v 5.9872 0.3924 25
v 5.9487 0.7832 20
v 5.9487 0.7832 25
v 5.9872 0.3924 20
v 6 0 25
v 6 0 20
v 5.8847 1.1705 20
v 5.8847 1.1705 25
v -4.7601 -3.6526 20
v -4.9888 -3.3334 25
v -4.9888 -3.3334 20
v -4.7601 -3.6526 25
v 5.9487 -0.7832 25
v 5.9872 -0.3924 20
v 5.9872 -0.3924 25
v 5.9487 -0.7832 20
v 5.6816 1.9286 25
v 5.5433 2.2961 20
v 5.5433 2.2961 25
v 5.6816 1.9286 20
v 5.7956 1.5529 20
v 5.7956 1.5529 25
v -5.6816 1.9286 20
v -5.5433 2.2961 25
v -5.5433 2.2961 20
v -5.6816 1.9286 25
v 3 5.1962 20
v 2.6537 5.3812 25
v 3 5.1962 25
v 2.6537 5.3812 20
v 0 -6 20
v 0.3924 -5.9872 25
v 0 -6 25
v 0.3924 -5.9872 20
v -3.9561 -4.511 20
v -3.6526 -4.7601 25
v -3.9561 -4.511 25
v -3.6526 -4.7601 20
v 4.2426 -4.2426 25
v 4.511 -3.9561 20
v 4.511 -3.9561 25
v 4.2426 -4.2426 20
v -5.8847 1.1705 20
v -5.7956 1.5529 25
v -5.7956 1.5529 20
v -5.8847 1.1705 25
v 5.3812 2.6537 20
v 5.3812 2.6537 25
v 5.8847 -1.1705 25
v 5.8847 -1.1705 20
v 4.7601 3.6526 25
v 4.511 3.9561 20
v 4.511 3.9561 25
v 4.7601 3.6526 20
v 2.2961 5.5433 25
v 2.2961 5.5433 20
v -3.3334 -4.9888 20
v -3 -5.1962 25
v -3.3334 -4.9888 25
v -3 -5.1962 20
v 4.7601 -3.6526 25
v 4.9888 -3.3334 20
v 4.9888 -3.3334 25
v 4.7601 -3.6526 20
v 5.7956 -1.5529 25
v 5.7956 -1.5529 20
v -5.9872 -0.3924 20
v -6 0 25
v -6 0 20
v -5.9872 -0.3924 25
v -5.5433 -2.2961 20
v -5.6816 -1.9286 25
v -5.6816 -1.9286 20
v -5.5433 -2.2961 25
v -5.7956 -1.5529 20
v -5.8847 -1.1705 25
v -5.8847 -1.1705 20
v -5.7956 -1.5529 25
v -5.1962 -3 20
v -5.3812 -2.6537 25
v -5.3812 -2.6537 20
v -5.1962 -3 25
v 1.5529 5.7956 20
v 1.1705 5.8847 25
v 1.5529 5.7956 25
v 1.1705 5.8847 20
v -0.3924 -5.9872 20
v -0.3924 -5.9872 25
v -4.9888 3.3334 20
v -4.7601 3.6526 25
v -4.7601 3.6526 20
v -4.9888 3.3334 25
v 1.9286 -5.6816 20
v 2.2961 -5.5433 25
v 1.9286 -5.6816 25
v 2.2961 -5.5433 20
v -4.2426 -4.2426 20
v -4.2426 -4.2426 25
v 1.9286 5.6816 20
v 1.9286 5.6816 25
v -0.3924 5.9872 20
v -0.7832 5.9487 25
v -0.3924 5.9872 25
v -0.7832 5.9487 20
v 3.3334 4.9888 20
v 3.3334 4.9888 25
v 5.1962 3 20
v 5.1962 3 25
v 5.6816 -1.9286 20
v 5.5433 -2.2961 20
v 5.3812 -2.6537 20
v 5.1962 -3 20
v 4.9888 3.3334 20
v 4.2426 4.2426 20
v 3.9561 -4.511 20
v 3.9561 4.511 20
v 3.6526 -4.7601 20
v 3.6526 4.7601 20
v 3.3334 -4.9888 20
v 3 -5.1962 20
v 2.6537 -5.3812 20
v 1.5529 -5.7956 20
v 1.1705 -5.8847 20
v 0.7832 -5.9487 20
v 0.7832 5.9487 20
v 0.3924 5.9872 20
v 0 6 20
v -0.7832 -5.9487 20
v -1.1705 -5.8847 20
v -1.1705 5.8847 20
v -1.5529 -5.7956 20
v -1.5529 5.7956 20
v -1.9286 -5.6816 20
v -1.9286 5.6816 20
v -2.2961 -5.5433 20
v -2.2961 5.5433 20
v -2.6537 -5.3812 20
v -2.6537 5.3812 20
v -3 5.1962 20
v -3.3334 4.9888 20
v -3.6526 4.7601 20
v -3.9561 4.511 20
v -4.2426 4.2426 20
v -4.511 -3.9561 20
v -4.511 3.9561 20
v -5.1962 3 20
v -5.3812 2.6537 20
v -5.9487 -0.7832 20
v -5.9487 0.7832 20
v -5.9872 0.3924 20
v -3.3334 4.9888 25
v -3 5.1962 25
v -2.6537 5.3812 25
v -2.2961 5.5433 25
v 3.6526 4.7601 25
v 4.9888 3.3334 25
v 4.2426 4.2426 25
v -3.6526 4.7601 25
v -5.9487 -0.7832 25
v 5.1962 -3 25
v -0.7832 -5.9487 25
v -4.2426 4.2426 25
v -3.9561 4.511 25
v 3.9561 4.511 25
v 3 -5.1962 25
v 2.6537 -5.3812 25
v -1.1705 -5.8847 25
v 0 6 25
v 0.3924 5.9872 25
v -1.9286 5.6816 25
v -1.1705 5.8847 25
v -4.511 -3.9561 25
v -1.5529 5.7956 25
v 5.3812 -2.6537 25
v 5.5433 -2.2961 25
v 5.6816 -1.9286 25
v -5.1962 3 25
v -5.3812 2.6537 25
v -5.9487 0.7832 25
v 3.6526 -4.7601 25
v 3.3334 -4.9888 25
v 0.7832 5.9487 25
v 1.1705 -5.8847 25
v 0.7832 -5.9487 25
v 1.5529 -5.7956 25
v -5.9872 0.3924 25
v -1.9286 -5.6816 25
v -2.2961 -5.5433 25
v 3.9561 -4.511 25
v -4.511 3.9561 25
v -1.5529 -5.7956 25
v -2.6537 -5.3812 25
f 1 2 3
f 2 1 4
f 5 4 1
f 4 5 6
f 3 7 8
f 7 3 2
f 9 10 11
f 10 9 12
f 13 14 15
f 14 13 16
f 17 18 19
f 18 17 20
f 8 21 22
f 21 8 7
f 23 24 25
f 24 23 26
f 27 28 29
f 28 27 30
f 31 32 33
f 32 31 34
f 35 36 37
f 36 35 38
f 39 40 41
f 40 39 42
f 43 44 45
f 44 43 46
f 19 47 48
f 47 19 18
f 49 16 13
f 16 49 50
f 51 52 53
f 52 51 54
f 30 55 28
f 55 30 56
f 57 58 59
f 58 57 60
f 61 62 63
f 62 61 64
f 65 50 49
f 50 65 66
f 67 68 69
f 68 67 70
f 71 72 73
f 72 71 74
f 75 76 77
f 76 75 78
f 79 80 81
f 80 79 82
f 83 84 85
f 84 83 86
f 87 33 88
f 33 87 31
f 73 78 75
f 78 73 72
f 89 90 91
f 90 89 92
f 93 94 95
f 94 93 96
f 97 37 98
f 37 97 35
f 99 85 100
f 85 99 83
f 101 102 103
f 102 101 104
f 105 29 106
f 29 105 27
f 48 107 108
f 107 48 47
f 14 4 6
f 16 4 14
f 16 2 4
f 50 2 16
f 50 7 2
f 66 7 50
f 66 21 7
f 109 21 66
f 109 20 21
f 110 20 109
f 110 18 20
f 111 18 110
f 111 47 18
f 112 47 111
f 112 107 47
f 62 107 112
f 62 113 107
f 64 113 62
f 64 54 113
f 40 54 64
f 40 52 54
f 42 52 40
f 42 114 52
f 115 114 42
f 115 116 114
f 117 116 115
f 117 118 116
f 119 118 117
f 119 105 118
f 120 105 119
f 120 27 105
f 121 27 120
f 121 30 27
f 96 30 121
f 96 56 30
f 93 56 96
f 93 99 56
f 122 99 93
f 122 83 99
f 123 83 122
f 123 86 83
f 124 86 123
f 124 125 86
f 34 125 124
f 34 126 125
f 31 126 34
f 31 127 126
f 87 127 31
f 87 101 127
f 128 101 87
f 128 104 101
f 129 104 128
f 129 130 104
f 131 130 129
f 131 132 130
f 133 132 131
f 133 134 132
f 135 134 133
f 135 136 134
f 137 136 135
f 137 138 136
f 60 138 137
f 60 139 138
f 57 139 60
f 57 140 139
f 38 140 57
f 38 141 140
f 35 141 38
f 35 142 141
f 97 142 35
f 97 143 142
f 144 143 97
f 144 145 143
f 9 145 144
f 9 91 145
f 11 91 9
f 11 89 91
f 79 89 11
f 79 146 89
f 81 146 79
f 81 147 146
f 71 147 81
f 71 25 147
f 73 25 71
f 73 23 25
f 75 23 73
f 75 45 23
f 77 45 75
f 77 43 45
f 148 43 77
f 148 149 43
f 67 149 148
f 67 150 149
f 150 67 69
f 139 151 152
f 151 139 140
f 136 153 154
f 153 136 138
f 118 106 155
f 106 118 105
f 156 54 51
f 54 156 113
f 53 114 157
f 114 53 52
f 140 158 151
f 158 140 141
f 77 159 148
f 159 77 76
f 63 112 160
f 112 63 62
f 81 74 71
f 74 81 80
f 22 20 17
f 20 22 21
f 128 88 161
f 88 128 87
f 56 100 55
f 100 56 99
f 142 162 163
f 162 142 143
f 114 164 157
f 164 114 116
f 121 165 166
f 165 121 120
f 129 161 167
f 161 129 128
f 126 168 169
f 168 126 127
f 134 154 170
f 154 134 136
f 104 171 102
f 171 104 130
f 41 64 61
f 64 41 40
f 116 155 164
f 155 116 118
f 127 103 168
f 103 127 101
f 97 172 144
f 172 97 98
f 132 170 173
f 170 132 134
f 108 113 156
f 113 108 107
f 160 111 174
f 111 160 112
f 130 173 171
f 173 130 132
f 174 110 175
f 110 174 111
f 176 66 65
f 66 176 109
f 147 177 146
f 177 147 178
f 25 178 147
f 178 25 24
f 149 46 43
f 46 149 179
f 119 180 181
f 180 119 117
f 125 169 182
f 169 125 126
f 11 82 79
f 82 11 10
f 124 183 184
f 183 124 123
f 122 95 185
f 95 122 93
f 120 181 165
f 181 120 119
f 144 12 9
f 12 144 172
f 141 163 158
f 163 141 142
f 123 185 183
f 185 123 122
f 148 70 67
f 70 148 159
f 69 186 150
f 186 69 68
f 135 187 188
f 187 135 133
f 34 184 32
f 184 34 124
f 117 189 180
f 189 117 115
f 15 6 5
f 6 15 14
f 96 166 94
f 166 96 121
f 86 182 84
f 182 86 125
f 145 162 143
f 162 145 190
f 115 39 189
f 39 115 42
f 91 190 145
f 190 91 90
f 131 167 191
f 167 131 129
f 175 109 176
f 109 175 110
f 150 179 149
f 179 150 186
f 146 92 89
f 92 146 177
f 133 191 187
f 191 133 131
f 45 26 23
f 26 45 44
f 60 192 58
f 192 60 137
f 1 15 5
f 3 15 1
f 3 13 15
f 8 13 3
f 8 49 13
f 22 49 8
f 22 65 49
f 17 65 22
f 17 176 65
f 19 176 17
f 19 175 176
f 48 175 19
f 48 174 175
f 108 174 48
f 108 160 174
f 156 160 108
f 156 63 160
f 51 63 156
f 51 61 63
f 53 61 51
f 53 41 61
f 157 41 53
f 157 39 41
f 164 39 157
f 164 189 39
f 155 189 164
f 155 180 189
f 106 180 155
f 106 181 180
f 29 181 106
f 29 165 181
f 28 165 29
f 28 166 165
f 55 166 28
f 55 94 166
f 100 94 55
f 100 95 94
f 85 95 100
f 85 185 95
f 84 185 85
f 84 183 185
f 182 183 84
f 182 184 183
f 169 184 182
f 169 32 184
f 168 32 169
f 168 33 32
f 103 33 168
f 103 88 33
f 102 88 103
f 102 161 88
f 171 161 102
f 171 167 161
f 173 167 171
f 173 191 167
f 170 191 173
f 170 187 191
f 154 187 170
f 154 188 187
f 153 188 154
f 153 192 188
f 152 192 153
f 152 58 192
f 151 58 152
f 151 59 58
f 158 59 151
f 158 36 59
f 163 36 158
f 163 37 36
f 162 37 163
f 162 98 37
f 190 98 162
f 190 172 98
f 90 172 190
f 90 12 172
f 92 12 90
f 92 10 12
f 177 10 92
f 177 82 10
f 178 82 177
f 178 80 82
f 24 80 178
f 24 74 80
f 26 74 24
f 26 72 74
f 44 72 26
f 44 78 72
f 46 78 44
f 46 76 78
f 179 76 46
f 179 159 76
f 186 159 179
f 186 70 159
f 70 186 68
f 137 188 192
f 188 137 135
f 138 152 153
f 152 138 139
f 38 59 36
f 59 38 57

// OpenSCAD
// Hose-barb reducer: joins 8 mm ID tubing to 5 mm ID tubing
// Print orientation: standing upright along +Z, centred on origin in X/Y

// ---------------- Parameters ----------------
reducer_d      = 10;   // bore diameter (through-hole)
tube8_d        = 8;    // inner diameter of first tubing set
tube5_d        = 5;    // inner diameter of second tubing set
barb8_h        = 10;   // height of each 8 mm barb
barb8_bottom   = 7.5;  // outer diameter of 8 mm barb at bottom
barb8_top      = 9.5;  // outer diameter of 8 mm barb at top
barb8_step     = 7.5;  // outer diameter after the sawtooth step
collar_d       = 12;   // diameter of the collar (z = 20 to 25)
barb5_h        = 8;    // height of each 5 mm barb
barb5_bottom   = 6.5;  // outer diameter of 5 mm barb at bottom
barb5_top      = 5.0;  // outer diameter of 5 mm barb at top
barb5_step     = 6.5;  // outer diameter after the sawtooth step
eps            = 0.5;  // overshoot for clean boolean cuts

$fn = 96;

// ---------------- Model ----------------
difference() {
    union() {
        // 8 mm tubing section: two stacked barbs with sawtooth profile
        for (z = [0, barb8_h])
            translate([0, 0, z])
                linear_extrude(height = reducer_d + 2 * eps, center = true)
                    polygon([
                        [0, 0],
                        [barb8_bottom / 2, barb8_h],
                        [barb8_top / 2, 0],
                        [barb8_step / 2, barb8_h]
                    ]);

        // collar
        translate([0, 0, 20])
            cylinder(d = collar_d, h = 5);

        // 5 mm tubing section: two stacked barbs with sawtooth profile
        for (z = [25, 25 + barb5_h])
            translate([0, 0, z])
                linear_extrude(height = reducer_d + 2 * eps, center = true)
                    polygon([
                        [0, 0],
                        [barb5_bottom / 2, barb5_h],
                        [barb5_top / 2, 0],
                        [barb5_step / 2, barb5_h]
                    ]);
    }

    // full-length bore
    translate([0, 0, -eps])
        cylinder(d = reducer_d, h = reducer_d + 2 * eps);
}
